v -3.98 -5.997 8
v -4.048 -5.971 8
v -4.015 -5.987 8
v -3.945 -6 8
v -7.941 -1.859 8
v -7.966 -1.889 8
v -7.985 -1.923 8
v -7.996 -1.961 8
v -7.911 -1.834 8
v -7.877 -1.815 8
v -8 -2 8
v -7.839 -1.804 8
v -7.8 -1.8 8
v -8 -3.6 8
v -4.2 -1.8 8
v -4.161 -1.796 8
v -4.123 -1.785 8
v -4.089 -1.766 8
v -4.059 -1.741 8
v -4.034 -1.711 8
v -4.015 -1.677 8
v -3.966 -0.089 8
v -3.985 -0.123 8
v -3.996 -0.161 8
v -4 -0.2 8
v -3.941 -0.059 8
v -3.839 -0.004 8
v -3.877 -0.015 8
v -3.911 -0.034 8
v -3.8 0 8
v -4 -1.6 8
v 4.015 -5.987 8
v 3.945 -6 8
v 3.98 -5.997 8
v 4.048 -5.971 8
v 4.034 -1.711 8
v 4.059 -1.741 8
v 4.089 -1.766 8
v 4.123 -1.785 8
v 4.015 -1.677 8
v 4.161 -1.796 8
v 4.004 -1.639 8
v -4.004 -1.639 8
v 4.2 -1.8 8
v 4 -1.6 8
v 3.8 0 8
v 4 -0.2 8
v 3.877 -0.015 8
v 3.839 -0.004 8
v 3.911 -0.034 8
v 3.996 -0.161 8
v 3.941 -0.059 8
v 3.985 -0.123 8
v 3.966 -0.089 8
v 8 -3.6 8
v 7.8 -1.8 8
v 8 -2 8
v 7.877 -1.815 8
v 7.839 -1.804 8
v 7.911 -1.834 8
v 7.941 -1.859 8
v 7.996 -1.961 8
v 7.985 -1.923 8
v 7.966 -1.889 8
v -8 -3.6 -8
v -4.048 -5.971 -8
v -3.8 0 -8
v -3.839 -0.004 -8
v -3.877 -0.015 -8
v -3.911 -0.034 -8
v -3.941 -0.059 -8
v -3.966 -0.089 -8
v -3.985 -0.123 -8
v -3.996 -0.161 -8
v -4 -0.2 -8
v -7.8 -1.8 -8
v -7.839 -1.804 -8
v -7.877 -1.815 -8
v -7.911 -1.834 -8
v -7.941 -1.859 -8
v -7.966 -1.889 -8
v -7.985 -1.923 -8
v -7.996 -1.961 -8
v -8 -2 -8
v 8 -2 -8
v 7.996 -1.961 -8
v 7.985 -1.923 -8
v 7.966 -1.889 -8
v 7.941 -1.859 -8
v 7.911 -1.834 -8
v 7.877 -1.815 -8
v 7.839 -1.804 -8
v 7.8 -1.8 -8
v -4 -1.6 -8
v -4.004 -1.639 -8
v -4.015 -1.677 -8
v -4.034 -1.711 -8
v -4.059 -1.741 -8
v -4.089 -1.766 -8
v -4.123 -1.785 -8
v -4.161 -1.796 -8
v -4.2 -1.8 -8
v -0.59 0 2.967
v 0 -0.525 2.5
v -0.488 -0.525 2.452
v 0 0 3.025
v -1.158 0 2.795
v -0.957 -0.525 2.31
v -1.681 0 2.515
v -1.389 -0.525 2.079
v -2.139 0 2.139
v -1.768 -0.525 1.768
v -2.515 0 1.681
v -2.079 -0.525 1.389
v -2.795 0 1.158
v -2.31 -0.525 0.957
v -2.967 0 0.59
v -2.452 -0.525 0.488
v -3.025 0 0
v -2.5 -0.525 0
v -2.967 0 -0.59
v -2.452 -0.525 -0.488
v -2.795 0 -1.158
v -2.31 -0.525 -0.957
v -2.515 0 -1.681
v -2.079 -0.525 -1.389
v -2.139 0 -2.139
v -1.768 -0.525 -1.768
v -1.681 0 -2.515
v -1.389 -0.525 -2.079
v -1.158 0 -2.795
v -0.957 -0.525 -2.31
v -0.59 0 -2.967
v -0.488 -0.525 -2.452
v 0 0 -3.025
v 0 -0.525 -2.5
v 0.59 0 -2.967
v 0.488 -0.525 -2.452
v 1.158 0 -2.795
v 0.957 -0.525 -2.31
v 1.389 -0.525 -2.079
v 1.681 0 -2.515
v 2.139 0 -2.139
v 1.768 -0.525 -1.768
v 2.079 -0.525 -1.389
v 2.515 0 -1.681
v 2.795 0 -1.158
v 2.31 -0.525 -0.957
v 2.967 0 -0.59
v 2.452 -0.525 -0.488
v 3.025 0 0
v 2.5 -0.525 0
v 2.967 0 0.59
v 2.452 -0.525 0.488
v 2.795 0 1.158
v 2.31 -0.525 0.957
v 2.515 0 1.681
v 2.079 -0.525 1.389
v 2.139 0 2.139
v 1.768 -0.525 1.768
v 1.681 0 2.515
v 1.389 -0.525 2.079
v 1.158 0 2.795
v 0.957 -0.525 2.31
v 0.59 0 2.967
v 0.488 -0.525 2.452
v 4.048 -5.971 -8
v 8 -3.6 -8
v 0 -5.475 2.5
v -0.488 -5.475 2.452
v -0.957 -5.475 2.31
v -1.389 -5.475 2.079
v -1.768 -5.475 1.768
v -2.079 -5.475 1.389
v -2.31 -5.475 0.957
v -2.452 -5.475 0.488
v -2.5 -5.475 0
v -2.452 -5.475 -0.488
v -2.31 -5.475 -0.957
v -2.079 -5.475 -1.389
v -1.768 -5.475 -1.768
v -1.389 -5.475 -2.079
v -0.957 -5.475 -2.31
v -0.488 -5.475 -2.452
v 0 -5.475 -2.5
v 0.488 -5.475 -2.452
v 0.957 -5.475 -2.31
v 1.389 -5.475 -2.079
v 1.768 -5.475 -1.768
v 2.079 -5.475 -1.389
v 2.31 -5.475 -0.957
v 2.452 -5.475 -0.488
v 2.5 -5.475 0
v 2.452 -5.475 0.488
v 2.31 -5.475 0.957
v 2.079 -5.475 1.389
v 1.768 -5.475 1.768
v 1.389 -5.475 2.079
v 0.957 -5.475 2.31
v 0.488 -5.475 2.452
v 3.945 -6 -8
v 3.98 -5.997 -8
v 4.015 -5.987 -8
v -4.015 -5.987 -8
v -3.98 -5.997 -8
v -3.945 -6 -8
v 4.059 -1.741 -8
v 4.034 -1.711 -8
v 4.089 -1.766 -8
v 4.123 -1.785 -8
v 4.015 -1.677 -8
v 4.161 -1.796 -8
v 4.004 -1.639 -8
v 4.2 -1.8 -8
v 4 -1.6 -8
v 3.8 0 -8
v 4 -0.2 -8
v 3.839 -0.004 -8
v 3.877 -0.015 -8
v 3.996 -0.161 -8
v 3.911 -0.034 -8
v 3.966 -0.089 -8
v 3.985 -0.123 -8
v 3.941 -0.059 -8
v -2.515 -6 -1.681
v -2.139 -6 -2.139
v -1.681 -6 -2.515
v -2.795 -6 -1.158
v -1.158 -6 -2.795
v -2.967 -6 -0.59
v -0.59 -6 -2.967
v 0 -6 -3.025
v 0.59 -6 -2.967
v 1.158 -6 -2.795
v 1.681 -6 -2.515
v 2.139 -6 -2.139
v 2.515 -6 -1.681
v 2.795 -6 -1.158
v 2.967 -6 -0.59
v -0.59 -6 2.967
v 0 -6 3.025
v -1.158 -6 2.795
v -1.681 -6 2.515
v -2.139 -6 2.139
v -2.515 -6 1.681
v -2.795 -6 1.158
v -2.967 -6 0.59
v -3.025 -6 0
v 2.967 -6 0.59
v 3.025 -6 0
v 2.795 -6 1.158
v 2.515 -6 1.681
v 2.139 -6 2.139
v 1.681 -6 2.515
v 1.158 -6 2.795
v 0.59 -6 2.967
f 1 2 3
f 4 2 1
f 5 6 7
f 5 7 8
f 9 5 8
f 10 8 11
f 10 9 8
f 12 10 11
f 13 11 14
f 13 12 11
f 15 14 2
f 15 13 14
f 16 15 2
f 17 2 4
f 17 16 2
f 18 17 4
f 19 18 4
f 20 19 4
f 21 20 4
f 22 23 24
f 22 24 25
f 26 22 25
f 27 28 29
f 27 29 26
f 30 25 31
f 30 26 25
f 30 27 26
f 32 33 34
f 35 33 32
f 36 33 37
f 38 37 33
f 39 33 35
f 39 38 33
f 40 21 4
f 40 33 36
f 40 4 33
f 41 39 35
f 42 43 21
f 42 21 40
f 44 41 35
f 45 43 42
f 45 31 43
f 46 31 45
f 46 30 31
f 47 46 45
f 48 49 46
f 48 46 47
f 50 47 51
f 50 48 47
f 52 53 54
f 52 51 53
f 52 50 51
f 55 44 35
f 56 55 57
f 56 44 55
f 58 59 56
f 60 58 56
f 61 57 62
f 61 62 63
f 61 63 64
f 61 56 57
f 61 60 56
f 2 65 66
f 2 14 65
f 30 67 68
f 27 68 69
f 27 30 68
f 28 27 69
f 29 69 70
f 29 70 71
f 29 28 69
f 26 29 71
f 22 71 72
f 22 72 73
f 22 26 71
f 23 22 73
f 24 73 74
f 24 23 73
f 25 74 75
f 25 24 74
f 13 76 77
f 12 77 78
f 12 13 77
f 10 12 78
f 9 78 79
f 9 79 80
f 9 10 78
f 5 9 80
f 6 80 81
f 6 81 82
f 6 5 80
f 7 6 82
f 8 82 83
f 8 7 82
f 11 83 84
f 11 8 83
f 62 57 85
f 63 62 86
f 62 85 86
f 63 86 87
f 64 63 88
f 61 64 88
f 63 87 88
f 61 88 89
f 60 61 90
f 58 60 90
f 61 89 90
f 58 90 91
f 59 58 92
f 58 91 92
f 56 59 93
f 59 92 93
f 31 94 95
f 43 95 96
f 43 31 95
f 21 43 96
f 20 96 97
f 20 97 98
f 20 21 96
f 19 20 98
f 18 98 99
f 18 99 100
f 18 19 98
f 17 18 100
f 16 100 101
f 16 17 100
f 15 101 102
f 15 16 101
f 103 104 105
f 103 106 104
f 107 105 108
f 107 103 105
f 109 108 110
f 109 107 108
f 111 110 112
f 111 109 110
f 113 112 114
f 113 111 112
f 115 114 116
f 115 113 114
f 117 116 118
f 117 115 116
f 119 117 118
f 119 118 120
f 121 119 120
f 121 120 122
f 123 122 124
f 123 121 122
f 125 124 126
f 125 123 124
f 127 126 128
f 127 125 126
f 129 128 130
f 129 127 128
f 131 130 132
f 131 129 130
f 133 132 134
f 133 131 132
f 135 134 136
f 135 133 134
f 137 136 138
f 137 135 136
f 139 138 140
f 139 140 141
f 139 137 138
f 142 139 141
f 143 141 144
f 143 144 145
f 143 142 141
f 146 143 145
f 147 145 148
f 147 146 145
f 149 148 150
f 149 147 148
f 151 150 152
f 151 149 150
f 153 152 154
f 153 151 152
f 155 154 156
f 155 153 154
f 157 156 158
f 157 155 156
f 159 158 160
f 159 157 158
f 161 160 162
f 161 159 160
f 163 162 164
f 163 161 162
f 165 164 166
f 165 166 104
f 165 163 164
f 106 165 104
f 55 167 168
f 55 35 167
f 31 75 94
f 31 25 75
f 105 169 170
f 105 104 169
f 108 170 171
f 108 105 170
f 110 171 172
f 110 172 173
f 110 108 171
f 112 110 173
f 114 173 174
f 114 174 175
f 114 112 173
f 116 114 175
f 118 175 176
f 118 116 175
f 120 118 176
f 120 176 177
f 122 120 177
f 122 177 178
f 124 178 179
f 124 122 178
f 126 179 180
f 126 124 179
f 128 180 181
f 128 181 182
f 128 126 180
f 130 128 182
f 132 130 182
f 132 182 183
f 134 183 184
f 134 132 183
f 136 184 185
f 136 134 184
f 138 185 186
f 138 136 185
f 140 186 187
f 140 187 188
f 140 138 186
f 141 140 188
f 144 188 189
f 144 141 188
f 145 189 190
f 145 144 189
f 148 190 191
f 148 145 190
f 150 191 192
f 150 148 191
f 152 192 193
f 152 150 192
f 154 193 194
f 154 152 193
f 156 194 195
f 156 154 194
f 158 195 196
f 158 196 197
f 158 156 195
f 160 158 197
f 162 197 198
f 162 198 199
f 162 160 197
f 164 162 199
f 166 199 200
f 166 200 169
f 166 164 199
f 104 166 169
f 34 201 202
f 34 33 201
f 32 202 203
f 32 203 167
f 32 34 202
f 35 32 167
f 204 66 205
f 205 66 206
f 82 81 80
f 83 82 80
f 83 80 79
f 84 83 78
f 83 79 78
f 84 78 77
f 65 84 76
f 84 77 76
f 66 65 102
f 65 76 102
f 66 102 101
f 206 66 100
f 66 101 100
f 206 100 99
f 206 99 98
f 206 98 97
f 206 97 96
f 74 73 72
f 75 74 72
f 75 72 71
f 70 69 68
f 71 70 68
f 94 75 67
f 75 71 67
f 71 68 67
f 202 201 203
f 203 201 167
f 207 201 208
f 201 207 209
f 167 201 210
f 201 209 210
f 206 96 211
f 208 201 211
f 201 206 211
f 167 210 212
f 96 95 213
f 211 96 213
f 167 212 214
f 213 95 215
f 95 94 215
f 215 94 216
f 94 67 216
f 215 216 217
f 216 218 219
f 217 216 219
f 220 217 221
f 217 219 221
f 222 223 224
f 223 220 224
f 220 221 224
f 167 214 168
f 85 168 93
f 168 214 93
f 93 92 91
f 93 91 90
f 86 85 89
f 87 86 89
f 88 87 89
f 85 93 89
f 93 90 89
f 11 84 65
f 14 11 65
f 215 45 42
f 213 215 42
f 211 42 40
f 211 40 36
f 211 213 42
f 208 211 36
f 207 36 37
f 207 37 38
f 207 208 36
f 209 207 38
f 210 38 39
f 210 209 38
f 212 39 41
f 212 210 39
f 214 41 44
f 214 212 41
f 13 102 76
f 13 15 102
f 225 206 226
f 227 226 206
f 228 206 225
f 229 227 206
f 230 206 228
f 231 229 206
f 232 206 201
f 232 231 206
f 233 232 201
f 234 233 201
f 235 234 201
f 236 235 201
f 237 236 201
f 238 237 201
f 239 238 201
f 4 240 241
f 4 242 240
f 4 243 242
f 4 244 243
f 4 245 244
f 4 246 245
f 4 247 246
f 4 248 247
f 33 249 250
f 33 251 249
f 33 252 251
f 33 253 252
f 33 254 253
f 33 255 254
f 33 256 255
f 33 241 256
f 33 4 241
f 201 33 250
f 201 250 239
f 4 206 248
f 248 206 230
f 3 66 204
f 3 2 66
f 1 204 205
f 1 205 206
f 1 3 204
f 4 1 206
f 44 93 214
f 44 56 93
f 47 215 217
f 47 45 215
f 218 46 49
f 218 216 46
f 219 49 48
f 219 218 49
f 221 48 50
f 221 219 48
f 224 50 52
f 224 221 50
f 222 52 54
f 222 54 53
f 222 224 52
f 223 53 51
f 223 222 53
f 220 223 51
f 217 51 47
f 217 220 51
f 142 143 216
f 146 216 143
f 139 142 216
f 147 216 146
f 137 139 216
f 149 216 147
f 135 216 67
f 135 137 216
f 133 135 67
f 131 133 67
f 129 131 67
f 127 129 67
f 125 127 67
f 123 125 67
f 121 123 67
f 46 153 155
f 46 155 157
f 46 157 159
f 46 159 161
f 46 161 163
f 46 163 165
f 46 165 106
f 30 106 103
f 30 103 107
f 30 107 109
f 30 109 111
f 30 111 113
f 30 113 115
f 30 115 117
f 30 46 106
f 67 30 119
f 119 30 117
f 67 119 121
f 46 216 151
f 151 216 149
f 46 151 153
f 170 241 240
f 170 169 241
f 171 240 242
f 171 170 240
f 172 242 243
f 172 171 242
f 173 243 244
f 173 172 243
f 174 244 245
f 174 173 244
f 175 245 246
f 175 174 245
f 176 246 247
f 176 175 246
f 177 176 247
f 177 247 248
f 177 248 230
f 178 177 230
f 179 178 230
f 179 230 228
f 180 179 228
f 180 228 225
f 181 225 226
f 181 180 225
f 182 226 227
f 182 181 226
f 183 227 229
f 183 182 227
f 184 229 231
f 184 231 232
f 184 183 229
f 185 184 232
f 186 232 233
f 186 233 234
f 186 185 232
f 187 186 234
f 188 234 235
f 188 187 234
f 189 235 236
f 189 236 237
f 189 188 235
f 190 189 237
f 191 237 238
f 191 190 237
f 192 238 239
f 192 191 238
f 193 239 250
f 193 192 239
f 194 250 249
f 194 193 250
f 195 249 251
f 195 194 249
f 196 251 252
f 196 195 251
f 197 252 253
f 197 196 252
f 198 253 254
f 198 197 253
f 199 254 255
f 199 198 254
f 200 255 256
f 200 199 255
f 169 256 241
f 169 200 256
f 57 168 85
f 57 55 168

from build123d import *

# Parameters (mm, degrees)
EXTRUDE_1_DEPTH = 8
FILLET_1_R      = 0.2


with BuildPart() as part:
    # Эскиз1 → Бобышка-Вытянуть1 (new body, symmetric)
    with BuildSketch(Plane.XY):
        Polygon((4, 0), (-4, 0), (-4, -1.8), (-8, -1.8), (-8, -3.6), (-4, -6), (4, -6), (8, -3.6), (8, -1.8), (4, -1.8), align=None)
    extrude(amount=EXTRUDE_1_DEPTH, both=True)

    # Эскиз4 → Отверстие обработанное метчиком M62 (revolve, cut)
    with BuildSketch(Plane(origin=(0, 0, 0), x_dir=(0, 0, 1), z_dir=(1, 0, 0))):
        Polygon((0, 0), (0, 6), (3.025, 6), (2.5, 5.475), (2.5, 0.525), (3.025, 0), align=None)
    revolve(axis=Axis((0, 6.35, 0), (0, -1, 0)), mode=Mode.SUBTRACT)

    # Скругление1
    fillet_1_edges = [part.edges().sort_by_distance(p)[0] for p in [
        (-4, 0, 0),
        (4, 0, 0),
        (4, -1.8, 0),
        (8, -1.8, 0),
        (4, -6, 0),
        (-4, -6, 0),
        (-8, -1.8, 0),
        (-4, -1.8, 0),
    ]]
    fillet(fillet_1_edges, radius=FILLET_1_R)


solid = part.part
